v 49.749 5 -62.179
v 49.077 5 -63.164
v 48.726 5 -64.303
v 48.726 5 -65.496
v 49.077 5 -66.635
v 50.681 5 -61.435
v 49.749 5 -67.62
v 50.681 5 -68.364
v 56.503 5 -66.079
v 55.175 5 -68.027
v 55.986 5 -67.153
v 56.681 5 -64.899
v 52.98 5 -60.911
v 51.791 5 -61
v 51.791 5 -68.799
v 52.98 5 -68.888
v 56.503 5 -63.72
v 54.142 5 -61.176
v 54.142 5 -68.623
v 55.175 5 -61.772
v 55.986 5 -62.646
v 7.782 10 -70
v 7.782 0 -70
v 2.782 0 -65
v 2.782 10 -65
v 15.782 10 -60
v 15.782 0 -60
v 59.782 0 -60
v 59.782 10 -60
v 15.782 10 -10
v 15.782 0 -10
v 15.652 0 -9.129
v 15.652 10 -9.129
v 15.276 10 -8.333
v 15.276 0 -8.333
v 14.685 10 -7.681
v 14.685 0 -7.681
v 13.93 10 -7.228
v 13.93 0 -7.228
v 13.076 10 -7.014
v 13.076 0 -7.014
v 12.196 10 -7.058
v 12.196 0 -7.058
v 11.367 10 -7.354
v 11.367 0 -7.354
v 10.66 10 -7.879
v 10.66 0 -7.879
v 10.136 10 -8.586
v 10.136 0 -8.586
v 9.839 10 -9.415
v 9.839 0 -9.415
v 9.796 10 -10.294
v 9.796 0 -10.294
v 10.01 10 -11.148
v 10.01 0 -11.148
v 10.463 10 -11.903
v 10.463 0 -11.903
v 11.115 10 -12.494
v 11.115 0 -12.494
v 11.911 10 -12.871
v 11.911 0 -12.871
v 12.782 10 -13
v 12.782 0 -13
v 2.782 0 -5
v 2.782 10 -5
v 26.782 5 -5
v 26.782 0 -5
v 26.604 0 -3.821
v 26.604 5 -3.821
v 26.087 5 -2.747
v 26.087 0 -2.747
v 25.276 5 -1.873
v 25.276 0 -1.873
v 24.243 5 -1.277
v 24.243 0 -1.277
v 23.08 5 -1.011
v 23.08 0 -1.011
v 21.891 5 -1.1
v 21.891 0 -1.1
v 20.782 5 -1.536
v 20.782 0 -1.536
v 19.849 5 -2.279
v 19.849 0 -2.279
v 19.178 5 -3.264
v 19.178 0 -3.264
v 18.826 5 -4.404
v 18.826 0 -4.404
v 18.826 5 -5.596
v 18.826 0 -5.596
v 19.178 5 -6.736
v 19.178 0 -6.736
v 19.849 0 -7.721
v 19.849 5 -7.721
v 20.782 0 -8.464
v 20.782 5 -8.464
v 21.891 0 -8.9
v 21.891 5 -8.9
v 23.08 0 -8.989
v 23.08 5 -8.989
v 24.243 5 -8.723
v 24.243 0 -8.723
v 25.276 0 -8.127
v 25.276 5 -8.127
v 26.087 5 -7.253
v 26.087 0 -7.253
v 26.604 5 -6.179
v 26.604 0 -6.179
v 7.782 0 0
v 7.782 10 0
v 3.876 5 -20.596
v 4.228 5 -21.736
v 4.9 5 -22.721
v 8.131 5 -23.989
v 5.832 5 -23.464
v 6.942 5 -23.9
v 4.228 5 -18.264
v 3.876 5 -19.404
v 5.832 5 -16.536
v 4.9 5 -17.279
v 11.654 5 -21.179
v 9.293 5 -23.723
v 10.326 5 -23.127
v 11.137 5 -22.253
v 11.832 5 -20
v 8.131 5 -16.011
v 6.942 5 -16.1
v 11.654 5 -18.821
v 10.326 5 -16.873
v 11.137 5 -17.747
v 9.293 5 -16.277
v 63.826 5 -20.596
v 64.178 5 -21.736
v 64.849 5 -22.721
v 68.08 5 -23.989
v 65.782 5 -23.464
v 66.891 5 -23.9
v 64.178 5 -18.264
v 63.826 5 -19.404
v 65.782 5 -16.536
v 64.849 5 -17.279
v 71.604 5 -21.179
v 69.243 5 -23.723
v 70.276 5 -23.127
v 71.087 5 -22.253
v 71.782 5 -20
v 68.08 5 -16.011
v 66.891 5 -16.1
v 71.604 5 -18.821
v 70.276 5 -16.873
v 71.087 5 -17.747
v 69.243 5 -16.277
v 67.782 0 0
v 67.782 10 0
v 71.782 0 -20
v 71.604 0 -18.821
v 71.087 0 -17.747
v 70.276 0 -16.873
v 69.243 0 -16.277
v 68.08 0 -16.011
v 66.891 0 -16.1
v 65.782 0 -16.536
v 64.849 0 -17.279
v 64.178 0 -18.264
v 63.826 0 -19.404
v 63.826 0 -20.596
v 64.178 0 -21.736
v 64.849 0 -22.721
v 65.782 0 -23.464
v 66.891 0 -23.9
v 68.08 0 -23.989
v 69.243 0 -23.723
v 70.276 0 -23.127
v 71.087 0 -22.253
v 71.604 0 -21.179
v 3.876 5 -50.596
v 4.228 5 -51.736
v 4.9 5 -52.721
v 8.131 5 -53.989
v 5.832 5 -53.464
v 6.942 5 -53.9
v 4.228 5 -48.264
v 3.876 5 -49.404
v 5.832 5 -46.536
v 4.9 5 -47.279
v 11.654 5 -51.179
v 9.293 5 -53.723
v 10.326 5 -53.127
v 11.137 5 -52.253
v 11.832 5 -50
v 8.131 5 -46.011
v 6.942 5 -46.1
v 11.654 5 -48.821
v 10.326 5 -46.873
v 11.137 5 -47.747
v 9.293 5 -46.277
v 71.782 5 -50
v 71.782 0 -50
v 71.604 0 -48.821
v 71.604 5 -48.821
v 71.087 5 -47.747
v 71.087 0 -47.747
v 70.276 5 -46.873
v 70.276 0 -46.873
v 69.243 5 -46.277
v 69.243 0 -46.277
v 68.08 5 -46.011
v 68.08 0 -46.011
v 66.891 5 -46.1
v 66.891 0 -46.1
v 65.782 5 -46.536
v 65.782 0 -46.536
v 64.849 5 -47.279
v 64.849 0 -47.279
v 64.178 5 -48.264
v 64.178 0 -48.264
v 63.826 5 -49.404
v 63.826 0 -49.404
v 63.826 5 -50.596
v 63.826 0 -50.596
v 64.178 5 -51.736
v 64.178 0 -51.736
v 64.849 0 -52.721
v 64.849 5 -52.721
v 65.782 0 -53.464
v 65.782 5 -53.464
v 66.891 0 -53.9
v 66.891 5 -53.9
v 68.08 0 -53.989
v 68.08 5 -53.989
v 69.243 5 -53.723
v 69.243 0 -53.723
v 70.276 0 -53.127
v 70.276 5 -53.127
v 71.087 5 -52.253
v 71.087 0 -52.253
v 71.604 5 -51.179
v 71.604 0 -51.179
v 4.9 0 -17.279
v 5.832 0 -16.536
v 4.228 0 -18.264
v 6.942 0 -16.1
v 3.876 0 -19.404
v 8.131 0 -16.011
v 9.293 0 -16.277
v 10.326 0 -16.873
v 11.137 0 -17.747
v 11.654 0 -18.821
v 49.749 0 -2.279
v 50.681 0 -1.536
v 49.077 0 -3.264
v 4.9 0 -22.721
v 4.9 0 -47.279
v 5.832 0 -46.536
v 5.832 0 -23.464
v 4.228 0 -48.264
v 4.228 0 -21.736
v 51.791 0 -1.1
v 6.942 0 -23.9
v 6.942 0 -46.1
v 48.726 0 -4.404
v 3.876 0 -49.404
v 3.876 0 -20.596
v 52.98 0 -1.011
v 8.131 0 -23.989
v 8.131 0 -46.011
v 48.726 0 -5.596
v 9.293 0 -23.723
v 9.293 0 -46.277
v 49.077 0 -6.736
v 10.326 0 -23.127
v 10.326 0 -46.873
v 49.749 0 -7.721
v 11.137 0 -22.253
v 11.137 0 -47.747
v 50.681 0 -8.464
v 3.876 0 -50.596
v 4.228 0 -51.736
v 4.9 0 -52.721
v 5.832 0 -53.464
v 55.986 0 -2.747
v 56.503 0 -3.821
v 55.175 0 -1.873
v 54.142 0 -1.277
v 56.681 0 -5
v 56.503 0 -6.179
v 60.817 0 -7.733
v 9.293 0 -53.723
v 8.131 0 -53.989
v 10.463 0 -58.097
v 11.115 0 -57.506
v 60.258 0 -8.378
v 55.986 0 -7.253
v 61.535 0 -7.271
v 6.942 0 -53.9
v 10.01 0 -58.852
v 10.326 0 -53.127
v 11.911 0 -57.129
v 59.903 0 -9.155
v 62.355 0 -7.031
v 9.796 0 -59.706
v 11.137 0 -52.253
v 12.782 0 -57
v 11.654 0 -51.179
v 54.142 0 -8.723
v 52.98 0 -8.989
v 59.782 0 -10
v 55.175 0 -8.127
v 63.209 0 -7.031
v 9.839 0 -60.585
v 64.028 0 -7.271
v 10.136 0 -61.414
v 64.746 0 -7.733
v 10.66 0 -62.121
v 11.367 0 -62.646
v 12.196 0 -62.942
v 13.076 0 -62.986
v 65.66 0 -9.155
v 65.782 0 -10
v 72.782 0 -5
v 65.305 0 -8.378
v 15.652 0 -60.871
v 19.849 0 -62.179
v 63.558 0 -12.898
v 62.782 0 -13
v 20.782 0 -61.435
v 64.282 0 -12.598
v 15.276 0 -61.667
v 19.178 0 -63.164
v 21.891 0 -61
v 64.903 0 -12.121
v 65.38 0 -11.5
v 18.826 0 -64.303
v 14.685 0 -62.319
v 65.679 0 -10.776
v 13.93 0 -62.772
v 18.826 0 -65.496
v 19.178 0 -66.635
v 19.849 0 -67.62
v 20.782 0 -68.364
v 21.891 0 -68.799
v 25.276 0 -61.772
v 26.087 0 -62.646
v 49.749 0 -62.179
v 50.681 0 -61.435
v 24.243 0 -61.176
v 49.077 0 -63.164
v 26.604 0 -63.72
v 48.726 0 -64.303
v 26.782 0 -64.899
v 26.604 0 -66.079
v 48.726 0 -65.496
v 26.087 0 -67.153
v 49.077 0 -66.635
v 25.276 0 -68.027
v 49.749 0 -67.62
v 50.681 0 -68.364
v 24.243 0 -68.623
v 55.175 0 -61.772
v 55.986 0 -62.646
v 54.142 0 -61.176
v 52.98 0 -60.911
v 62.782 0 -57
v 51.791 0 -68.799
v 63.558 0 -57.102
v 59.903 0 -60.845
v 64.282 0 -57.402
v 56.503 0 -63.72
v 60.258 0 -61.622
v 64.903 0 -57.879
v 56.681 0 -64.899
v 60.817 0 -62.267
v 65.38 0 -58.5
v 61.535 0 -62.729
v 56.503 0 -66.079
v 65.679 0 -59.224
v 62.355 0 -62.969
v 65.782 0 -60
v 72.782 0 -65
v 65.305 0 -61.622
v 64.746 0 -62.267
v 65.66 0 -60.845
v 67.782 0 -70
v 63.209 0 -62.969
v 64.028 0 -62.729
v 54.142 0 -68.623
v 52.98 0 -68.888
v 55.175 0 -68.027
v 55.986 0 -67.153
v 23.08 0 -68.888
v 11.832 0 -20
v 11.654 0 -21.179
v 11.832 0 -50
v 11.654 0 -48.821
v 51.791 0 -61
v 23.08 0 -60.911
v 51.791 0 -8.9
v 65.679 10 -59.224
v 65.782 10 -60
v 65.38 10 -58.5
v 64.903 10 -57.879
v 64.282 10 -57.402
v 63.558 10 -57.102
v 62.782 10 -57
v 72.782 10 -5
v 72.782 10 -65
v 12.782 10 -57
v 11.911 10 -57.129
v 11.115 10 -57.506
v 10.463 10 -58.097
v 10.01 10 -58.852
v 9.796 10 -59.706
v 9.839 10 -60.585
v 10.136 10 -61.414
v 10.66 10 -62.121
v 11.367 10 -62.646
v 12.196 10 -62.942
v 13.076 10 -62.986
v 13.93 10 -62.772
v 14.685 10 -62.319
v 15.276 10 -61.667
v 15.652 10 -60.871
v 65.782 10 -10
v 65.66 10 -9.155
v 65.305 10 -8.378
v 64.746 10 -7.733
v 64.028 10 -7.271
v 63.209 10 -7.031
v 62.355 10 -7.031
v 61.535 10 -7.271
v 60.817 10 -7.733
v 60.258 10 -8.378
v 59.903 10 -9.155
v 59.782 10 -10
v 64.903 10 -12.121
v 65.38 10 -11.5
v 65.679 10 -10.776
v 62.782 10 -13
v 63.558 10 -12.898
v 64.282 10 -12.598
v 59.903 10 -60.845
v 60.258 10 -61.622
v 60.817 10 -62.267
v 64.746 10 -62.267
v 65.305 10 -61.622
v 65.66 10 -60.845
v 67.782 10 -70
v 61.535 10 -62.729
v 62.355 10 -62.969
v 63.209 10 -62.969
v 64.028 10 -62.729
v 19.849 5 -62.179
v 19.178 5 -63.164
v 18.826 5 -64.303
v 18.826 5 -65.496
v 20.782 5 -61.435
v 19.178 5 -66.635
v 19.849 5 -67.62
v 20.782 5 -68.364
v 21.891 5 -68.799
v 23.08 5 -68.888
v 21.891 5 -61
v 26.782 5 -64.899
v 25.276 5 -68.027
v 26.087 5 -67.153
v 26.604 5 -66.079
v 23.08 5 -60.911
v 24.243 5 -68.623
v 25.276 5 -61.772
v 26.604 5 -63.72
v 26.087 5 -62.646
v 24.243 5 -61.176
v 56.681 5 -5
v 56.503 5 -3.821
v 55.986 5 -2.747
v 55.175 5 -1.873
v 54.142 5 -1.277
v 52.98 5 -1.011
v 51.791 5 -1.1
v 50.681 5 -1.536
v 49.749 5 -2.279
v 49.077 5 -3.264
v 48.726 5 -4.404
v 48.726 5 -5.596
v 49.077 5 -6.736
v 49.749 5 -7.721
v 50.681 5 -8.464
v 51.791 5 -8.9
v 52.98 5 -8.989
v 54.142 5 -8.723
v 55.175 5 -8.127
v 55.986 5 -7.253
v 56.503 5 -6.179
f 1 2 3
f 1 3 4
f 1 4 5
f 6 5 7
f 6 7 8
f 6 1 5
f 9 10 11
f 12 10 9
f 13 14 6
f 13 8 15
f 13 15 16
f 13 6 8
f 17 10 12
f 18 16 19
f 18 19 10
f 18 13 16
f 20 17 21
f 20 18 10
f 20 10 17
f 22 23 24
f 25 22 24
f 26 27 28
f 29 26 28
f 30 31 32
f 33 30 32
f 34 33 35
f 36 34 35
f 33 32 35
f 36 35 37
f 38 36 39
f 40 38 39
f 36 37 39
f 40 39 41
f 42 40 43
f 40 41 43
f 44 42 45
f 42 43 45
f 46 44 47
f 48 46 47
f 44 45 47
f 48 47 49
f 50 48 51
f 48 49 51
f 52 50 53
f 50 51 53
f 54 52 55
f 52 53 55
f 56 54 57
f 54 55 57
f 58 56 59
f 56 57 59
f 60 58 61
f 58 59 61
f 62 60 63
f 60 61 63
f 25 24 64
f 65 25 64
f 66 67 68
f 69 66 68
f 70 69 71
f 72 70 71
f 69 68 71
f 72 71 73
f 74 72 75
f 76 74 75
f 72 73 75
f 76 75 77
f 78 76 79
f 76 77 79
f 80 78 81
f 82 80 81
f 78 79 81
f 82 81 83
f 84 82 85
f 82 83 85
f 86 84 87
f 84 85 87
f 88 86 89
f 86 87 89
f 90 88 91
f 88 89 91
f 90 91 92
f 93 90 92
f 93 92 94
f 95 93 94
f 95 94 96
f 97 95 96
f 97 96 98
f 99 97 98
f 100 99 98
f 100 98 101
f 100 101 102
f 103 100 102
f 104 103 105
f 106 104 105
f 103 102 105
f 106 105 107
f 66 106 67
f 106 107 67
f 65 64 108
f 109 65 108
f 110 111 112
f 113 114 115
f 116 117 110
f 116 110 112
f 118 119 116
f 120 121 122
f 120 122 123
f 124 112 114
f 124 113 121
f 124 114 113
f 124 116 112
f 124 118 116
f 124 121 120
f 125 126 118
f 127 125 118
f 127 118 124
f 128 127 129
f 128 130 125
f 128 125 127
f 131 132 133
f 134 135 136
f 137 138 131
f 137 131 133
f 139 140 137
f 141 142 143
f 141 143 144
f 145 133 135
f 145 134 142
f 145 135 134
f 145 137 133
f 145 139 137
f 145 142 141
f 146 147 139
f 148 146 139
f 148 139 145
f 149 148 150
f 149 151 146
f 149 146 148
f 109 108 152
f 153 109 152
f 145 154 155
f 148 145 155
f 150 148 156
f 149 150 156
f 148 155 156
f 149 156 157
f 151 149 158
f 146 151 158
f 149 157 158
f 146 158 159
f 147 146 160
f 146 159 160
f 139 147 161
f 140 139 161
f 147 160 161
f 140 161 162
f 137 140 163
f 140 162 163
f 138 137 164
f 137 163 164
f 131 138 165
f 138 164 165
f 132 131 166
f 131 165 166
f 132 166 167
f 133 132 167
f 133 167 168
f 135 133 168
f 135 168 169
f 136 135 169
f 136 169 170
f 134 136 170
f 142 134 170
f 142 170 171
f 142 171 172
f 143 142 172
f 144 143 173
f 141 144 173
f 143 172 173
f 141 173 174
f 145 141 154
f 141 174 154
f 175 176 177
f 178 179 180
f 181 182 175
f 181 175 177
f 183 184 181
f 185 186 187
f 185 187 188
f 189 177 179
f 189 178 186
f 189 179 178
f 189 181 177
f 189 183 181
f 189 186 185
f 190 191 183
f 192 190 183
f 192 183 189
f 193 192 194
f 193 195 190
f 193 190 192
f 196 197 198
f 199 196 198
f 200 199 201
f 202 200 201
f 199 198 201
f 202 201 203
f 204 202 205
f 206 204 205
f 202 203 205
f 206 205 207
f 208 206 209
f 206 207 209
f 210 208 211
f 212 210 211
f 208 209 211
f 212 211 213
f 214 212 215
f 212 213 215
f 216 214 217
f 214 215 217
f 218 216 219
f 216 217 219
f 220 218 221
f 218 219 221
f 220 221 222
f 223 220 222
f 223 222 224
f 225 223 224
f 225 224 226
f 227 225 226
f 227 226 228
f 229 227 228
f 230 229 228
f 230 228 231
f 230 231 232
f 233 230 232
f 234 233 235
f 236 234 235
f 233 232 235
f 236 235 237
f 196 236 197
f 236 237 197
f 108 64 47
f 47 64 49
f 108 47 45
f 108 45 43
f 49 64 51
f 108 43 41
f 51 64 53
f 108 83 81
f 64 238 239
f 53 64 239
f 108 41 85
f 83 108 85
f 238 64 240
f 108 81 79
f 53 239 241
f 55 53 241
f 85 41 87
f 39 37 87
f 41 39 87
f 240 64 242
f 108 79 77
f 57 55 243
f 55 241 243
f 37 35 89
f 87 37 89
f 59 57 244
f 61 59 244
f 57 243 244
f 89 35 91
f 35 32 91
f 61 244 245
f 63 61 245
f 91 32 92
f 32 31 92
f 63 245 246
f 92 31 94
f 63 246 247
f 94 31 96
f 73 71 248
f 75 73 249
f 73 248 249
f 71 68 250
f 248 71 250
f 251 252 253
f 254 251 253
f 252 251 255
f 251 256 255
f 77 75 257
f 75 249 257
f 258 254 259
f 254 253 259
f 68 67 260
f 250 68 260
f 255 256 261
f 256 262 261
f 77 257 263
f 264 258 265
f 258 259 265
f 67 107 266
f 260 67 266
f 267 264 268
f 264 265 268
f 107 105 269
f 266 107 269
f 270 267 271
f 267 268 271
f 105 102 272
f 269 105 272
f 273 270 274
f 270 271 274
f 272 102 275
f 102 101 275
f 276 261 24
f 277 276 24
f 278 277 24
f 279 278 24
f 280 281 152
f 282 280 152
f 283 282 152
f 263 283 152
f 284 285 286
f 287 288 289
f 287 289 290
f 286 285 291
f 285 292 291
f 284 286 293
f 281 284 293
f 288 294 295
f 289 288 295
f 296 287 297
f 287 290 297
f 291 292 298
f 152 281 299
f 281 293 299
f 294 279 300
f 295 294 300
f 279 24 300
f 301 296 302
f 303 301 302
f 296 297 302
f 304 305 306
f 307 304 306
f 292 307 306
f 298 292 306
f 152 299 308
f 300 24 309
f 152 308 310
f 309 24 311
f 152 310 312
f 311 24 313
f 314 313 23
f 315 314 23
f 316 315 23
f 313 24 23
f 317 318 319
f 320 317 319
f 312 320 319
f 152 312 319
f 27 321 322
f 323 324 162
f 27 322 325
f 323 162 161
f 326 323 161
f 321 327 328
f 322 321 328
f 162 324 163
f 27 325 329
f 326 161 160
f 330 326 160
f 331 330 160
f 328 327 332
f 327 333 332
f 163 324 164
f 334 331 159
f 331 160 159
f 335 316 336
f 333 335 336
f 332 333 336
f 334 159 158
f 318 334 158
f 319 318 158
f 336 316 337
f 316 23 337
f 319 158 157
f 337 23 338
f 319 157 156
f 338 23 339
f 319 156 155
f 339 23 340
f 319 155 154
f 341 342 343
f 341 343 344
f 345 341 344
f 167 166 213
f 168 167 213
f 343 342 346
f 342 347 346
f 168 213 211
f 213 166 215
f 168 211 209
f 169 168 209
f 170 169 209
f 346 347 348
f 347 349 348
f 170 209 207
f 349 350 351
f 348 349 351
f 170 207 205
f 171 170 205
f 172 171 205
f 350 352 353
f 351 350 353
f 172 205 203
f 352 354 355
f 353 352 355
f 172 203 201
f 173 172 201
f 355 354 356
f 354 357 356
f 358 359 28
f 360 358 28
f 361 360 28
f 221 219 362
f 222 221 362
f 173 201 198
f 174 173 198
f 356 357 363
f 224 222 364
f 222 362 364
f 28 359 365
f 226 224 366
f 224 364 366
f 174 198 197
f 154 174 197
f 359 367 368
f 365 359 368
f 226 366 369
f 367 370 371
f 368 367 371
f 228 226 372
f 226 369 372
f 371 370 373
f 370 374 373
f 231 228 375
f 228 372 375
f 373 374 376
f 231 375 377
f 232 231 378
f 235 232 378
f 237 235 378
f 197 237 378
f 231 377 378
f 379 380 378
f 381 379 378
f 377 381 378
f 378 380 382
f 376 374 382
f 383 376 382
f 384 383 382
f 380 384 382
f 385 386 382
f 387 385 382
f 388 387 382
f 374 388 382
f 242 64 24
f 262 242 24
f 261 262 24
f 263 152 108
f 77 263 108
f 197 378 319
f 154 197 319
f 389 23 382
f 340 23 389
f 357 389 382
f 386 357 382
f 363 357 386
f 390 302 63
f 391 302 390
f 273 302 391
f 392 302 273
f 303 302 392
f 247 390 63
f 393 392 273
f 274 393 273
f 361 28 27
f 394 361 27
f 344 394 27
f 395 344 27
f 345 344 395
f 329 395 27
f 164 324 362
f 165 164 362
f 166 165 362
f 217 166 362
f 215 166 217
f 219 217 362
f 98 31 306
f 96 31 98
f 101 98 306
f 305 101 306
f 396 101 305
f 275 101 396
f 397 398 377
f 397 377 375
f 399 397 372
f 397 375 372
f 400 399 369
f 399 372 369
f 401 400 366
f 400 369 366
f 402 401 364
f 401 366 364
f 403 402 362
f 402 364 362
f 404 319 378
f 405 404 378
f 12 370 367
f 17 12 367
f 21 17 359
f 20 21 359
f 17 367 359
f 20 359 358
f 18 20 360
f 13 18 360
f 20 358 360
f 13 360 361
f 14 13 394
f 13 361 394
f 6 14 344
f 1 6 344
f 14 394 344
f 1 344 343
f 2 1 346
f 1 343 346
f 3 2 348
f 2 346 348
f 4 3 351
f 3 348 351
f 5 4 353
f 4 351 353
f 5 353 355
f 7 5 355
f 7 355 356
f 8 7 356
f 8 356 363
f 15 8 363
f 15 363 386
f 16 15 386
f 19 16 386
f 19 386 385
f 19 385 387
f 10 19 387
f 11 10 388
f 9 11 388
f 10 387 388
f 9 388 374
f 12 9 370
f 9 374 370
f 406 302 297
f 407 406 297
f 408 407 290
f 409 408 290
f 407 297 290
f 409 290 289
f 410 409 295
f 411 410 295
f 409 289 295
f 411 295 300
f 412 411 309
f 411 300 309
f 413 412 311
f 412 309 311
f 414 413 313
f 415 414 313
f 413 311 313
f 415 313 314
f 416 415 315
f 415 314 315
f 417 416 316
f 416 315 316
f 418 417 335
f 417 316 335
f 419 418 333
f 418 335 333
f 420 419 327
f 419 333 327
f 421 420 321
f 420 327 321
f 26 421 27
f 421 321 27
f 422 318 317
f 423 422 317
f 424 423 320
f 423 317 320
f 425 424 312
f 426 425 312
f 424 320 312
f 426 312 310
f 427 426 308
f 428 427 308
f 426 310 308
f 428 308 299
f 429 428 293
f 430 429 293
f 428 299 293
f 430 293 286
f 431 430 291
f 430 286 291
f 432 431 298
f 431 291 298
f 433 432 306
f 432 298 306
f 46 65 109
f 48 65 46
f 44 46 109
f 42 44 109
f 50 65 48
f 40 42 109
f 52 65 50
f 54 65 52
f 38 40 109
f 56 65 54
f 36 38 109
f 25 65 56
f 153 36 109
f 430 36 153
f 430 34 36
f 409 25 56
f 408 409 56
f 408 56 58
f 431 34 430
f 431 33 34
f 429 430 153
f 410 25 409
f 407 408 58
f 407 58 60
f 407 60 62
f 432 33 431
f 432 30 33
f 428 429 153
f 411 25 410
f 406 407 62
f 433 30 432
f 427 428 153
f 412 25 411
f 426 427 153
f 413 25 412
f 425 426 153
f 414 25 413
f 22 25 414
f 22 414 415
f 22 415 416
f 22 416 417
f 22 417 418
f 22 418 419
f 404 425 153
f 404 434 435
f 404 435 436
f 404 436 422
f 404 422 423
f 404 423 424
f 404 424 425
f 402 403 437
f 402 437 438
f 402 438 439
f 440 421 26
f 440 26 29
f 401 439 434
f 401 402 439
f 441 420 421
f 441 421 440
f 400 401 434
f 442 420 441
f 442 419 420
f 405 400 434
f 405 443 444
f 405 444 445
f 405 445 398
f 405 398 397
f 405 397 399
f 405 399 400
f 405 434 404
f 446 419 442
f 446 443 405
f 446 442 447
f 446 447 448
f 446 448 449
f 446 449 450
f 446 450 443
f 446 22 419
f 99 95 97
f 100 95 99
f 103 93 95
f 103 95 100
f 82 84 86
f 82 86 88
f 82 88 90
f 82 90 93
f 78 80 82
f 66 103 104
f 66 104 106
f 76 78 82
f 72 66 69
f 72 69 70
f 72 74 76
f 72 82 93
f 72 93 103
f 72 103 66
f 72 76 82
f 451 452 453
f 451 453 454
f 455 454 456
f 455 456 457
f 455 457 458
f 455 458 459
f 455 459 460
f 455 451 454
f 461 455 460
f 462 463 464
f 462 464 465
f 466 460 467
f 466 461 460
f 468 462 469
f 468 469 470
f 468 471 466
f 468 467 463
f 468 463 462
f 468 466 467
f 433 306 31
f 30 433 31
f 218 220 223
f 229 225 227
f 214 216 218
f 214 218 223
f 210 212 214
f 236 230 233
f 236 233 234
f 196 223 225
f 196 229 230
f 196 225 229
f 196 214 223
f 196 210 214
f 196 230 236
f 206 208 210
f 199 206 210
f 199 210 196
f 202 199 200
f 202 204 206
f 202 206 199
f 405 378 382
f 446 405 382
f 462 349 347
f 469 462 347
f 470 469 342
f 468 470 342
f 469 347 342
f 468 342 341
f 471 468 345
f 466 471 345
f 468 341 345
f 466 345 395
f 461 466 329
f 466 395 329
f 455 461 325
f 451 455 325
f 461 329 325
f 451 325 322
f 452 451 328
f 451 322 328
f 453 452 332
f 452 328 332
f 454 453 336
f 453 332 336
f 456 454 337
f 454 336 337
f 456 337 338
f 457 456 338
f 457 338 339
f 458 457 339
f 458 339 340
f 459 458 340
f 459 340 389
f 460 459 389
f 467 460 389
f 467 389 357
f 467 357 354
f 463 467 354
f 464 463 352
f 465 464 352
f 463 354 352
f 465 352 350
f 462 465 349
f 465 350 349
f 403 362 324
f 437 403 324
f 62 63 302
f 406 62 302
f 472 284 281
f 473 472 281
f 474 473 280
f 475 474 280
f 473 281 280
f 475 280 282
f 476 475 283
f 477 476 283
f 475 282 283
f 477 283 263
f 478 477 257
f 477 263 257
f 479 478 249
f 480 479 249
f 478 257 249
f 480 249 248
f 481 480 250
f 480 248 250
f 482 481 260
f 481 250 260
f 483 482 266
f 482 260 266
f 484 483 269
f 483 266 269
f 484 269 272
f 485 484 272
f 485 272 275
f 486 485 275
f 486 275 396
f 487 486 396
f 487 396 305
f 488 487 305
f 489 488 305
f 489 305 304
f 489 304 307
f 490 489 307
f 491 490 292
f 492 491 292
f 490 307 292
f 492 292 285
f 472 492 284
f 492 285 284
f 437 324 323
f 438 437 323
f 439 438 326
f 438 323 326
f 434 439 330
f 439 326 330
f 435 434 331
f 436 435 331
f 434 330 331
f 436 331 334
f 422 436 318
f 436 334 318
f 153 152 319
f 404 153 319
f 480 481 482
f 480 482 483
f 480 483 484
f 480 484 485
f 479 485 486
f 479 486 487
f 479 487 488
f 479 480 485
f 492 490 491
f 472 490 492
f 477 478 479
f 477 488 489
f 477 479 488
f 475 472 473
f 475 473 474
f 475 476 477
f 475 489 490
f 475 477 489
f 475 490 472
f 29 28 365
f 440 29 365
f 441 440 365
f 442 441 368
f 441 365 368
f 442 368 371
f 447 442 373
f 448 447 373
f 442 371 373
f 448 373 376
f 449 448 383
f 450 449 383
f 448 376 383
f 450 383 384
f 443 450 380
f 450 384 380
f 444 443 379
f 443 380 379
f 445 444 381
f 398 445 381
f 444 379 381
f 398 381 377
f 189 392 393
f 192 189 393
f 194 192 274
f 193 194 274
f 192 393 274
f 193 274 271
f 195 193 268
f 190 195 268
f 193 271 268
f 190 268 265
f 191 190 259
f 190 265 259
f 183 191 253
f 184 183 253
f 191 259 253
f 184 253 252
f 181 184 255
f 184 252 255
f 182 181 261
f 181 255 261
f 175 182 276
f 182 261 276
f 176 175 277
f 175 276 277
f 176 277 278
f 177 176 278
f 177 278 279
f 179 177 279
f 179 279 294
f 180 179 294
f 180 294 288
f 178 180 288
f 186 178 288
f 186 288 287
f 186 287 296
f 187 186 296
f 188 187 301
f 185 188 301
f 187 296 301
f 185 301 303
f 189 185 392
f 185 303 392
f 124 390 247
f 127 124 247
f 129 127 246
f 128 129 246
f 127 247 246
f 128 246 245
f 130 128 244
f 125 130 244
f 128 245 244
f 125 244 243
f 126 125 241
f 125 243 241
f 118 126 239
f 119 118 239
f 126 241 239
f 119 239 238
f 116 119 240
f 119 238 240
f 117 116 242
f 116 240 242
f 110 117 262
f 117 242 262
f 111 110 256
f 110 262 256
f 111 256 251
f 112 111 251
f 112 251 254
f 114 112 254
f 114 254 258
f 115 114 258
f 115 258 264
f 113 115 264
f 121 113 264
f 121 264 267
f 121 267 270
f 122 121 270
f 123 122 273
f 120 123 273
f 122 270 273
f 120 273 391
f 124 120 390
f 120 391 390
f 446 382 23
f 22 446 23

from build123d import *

# Parameters (mm, degrees)
BOSS_EXTRUDE1_DEPTH = 10
SKETCH2_R           = 4
CUT_EXTRUDE1_DEPTH  = 5


with BuildPart() as part:
    # Sketch1 → Boss-Extrude1 (new body)
    with BuildSketch(Plane(origin=(0, 0, 0), x_dir=(1, 0, 0), z_dir=(0, 1, 0))):
        Polygon((2.781569966, 65), (2.781569966, 5), (7.781569966, 0), (67.781569966, 0), (72.781569966, 5), (72.781569966, 65), (67.781569966, 70), (7.781569966, 70), align=None)
        with BuildLine():
            ThreePointArc((12.781569966, 57), (10.660249622, 62.121320344), (15.781569966, 60))
            Line((15.781569966, 60), (59.781569966, 60))
            ThreePointArc((59.781569966, 60), (62.781569966, 63), (65.781569966, 60))
            ThreePointArc((65.781569966, 60), (64.902890309, 57.878679656), (62.781569966, 57))
            Line((62.781569966, 57), (62.781569966, 13))
            ThreePointArc((62.781569966, 13), (64.902890309, 12.121320344), (65.781569966, 10))
            ThreePointArc((65.781569966, 10), (62.781569966, 7), (59.781569966, 10))
            Line((59.781569966, 10), (15.781569966, 10))
            ThreePointArc((15.781569966, 10), (10.660249622, 7.878679656), (12.781569966, 13))
            Line((12.781569966, 13), (12.781569966, 57))
        make_face(mode=Mode.SUBTRACT)
    extrude(amount=BOSS_EXTRUDE1_DEPTH)

    # Sketch2 → Cut-Extrude1 (cut)
    with BuildSketch(Plane.XZ):
        with Locations((22.781569966, -5)):
            Circle(SKETCH2_R)
        with Locations((52.681064902, -5)):
            Circle(SKETCH2_R)
        with Locations((67.781569966, -20)):
            Circle(SKETCH2_R)
        with Locations((67.781569966, -50)):
            Circle(SKETCH2_R)
        with Locations((52.681064902, -64.899494937)):
            Circle(SKETCH2_R)
        with Locations((22.781569966, -64.899494937)):
            Circle(SKETCH2_R)
        with Locations((7.831822498, -50)):
            Circle(SKETCH2_R)
        with Locations((7.831822498, -20)):
            Circle(SKETCH2_R)
    extrude(amount=-CUT_EXTRUDE1_DEPTH, mode=Mode.SUBTRACT)


solid = part.part
